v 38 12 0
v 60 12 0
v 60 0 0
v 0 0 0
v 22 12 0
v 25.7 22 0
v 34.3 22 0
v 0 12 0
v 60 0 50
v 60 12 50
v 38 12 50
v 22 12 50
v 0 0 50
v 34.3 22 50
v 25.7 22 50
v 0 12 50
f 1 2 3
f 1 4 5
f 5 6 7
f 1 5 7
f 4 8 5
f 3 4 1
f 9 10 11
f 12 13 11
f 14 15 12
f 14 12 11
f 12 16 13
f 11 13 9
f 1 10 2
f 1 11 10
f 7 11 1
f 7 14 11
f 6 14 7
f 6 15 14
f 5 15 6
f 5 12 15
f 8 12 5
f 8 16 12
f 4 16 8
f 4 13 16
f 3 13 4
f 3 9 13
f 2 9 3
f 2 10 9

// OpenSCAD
$fn = 32;

// ----------------------------------------------------------------------
// V guide rail: dovetail, 60 mm wide
// ----------------------------------------------------------------------

// --- parameters (mm) ---
rail_w = 60;              // rail width, X
base_t = 12;              // base plate thickness
v_depth = 10;             // V feature depth / height
v_half_w = 8;             // half width of the V at the base face
plate_t = 50;             // rail length, Z (the extrusion height)
top_half_w = 4.3;         // half width at the dovetail top
fit_tol = 0.05;           // declared fit tolerance (prompt contract)
free_tol = 0.3;           // declared free tolerance (prompt contract)

dovetail_base = 2 * v_half_w;  // dovetail width at the base
dovetail_top = 2 * top_half_w;  // dovetail width at the top

profile = [[0, 0], [60, 0], [60, 12], [38, 12], [34.3, 22], [25.7, 22], [22, 12], [0, 12]];  // primary outline, 8 points, counter clockwise

// --- the one profile operation ---
linear_extrude(height = plate_t) polygon(points = profile);
